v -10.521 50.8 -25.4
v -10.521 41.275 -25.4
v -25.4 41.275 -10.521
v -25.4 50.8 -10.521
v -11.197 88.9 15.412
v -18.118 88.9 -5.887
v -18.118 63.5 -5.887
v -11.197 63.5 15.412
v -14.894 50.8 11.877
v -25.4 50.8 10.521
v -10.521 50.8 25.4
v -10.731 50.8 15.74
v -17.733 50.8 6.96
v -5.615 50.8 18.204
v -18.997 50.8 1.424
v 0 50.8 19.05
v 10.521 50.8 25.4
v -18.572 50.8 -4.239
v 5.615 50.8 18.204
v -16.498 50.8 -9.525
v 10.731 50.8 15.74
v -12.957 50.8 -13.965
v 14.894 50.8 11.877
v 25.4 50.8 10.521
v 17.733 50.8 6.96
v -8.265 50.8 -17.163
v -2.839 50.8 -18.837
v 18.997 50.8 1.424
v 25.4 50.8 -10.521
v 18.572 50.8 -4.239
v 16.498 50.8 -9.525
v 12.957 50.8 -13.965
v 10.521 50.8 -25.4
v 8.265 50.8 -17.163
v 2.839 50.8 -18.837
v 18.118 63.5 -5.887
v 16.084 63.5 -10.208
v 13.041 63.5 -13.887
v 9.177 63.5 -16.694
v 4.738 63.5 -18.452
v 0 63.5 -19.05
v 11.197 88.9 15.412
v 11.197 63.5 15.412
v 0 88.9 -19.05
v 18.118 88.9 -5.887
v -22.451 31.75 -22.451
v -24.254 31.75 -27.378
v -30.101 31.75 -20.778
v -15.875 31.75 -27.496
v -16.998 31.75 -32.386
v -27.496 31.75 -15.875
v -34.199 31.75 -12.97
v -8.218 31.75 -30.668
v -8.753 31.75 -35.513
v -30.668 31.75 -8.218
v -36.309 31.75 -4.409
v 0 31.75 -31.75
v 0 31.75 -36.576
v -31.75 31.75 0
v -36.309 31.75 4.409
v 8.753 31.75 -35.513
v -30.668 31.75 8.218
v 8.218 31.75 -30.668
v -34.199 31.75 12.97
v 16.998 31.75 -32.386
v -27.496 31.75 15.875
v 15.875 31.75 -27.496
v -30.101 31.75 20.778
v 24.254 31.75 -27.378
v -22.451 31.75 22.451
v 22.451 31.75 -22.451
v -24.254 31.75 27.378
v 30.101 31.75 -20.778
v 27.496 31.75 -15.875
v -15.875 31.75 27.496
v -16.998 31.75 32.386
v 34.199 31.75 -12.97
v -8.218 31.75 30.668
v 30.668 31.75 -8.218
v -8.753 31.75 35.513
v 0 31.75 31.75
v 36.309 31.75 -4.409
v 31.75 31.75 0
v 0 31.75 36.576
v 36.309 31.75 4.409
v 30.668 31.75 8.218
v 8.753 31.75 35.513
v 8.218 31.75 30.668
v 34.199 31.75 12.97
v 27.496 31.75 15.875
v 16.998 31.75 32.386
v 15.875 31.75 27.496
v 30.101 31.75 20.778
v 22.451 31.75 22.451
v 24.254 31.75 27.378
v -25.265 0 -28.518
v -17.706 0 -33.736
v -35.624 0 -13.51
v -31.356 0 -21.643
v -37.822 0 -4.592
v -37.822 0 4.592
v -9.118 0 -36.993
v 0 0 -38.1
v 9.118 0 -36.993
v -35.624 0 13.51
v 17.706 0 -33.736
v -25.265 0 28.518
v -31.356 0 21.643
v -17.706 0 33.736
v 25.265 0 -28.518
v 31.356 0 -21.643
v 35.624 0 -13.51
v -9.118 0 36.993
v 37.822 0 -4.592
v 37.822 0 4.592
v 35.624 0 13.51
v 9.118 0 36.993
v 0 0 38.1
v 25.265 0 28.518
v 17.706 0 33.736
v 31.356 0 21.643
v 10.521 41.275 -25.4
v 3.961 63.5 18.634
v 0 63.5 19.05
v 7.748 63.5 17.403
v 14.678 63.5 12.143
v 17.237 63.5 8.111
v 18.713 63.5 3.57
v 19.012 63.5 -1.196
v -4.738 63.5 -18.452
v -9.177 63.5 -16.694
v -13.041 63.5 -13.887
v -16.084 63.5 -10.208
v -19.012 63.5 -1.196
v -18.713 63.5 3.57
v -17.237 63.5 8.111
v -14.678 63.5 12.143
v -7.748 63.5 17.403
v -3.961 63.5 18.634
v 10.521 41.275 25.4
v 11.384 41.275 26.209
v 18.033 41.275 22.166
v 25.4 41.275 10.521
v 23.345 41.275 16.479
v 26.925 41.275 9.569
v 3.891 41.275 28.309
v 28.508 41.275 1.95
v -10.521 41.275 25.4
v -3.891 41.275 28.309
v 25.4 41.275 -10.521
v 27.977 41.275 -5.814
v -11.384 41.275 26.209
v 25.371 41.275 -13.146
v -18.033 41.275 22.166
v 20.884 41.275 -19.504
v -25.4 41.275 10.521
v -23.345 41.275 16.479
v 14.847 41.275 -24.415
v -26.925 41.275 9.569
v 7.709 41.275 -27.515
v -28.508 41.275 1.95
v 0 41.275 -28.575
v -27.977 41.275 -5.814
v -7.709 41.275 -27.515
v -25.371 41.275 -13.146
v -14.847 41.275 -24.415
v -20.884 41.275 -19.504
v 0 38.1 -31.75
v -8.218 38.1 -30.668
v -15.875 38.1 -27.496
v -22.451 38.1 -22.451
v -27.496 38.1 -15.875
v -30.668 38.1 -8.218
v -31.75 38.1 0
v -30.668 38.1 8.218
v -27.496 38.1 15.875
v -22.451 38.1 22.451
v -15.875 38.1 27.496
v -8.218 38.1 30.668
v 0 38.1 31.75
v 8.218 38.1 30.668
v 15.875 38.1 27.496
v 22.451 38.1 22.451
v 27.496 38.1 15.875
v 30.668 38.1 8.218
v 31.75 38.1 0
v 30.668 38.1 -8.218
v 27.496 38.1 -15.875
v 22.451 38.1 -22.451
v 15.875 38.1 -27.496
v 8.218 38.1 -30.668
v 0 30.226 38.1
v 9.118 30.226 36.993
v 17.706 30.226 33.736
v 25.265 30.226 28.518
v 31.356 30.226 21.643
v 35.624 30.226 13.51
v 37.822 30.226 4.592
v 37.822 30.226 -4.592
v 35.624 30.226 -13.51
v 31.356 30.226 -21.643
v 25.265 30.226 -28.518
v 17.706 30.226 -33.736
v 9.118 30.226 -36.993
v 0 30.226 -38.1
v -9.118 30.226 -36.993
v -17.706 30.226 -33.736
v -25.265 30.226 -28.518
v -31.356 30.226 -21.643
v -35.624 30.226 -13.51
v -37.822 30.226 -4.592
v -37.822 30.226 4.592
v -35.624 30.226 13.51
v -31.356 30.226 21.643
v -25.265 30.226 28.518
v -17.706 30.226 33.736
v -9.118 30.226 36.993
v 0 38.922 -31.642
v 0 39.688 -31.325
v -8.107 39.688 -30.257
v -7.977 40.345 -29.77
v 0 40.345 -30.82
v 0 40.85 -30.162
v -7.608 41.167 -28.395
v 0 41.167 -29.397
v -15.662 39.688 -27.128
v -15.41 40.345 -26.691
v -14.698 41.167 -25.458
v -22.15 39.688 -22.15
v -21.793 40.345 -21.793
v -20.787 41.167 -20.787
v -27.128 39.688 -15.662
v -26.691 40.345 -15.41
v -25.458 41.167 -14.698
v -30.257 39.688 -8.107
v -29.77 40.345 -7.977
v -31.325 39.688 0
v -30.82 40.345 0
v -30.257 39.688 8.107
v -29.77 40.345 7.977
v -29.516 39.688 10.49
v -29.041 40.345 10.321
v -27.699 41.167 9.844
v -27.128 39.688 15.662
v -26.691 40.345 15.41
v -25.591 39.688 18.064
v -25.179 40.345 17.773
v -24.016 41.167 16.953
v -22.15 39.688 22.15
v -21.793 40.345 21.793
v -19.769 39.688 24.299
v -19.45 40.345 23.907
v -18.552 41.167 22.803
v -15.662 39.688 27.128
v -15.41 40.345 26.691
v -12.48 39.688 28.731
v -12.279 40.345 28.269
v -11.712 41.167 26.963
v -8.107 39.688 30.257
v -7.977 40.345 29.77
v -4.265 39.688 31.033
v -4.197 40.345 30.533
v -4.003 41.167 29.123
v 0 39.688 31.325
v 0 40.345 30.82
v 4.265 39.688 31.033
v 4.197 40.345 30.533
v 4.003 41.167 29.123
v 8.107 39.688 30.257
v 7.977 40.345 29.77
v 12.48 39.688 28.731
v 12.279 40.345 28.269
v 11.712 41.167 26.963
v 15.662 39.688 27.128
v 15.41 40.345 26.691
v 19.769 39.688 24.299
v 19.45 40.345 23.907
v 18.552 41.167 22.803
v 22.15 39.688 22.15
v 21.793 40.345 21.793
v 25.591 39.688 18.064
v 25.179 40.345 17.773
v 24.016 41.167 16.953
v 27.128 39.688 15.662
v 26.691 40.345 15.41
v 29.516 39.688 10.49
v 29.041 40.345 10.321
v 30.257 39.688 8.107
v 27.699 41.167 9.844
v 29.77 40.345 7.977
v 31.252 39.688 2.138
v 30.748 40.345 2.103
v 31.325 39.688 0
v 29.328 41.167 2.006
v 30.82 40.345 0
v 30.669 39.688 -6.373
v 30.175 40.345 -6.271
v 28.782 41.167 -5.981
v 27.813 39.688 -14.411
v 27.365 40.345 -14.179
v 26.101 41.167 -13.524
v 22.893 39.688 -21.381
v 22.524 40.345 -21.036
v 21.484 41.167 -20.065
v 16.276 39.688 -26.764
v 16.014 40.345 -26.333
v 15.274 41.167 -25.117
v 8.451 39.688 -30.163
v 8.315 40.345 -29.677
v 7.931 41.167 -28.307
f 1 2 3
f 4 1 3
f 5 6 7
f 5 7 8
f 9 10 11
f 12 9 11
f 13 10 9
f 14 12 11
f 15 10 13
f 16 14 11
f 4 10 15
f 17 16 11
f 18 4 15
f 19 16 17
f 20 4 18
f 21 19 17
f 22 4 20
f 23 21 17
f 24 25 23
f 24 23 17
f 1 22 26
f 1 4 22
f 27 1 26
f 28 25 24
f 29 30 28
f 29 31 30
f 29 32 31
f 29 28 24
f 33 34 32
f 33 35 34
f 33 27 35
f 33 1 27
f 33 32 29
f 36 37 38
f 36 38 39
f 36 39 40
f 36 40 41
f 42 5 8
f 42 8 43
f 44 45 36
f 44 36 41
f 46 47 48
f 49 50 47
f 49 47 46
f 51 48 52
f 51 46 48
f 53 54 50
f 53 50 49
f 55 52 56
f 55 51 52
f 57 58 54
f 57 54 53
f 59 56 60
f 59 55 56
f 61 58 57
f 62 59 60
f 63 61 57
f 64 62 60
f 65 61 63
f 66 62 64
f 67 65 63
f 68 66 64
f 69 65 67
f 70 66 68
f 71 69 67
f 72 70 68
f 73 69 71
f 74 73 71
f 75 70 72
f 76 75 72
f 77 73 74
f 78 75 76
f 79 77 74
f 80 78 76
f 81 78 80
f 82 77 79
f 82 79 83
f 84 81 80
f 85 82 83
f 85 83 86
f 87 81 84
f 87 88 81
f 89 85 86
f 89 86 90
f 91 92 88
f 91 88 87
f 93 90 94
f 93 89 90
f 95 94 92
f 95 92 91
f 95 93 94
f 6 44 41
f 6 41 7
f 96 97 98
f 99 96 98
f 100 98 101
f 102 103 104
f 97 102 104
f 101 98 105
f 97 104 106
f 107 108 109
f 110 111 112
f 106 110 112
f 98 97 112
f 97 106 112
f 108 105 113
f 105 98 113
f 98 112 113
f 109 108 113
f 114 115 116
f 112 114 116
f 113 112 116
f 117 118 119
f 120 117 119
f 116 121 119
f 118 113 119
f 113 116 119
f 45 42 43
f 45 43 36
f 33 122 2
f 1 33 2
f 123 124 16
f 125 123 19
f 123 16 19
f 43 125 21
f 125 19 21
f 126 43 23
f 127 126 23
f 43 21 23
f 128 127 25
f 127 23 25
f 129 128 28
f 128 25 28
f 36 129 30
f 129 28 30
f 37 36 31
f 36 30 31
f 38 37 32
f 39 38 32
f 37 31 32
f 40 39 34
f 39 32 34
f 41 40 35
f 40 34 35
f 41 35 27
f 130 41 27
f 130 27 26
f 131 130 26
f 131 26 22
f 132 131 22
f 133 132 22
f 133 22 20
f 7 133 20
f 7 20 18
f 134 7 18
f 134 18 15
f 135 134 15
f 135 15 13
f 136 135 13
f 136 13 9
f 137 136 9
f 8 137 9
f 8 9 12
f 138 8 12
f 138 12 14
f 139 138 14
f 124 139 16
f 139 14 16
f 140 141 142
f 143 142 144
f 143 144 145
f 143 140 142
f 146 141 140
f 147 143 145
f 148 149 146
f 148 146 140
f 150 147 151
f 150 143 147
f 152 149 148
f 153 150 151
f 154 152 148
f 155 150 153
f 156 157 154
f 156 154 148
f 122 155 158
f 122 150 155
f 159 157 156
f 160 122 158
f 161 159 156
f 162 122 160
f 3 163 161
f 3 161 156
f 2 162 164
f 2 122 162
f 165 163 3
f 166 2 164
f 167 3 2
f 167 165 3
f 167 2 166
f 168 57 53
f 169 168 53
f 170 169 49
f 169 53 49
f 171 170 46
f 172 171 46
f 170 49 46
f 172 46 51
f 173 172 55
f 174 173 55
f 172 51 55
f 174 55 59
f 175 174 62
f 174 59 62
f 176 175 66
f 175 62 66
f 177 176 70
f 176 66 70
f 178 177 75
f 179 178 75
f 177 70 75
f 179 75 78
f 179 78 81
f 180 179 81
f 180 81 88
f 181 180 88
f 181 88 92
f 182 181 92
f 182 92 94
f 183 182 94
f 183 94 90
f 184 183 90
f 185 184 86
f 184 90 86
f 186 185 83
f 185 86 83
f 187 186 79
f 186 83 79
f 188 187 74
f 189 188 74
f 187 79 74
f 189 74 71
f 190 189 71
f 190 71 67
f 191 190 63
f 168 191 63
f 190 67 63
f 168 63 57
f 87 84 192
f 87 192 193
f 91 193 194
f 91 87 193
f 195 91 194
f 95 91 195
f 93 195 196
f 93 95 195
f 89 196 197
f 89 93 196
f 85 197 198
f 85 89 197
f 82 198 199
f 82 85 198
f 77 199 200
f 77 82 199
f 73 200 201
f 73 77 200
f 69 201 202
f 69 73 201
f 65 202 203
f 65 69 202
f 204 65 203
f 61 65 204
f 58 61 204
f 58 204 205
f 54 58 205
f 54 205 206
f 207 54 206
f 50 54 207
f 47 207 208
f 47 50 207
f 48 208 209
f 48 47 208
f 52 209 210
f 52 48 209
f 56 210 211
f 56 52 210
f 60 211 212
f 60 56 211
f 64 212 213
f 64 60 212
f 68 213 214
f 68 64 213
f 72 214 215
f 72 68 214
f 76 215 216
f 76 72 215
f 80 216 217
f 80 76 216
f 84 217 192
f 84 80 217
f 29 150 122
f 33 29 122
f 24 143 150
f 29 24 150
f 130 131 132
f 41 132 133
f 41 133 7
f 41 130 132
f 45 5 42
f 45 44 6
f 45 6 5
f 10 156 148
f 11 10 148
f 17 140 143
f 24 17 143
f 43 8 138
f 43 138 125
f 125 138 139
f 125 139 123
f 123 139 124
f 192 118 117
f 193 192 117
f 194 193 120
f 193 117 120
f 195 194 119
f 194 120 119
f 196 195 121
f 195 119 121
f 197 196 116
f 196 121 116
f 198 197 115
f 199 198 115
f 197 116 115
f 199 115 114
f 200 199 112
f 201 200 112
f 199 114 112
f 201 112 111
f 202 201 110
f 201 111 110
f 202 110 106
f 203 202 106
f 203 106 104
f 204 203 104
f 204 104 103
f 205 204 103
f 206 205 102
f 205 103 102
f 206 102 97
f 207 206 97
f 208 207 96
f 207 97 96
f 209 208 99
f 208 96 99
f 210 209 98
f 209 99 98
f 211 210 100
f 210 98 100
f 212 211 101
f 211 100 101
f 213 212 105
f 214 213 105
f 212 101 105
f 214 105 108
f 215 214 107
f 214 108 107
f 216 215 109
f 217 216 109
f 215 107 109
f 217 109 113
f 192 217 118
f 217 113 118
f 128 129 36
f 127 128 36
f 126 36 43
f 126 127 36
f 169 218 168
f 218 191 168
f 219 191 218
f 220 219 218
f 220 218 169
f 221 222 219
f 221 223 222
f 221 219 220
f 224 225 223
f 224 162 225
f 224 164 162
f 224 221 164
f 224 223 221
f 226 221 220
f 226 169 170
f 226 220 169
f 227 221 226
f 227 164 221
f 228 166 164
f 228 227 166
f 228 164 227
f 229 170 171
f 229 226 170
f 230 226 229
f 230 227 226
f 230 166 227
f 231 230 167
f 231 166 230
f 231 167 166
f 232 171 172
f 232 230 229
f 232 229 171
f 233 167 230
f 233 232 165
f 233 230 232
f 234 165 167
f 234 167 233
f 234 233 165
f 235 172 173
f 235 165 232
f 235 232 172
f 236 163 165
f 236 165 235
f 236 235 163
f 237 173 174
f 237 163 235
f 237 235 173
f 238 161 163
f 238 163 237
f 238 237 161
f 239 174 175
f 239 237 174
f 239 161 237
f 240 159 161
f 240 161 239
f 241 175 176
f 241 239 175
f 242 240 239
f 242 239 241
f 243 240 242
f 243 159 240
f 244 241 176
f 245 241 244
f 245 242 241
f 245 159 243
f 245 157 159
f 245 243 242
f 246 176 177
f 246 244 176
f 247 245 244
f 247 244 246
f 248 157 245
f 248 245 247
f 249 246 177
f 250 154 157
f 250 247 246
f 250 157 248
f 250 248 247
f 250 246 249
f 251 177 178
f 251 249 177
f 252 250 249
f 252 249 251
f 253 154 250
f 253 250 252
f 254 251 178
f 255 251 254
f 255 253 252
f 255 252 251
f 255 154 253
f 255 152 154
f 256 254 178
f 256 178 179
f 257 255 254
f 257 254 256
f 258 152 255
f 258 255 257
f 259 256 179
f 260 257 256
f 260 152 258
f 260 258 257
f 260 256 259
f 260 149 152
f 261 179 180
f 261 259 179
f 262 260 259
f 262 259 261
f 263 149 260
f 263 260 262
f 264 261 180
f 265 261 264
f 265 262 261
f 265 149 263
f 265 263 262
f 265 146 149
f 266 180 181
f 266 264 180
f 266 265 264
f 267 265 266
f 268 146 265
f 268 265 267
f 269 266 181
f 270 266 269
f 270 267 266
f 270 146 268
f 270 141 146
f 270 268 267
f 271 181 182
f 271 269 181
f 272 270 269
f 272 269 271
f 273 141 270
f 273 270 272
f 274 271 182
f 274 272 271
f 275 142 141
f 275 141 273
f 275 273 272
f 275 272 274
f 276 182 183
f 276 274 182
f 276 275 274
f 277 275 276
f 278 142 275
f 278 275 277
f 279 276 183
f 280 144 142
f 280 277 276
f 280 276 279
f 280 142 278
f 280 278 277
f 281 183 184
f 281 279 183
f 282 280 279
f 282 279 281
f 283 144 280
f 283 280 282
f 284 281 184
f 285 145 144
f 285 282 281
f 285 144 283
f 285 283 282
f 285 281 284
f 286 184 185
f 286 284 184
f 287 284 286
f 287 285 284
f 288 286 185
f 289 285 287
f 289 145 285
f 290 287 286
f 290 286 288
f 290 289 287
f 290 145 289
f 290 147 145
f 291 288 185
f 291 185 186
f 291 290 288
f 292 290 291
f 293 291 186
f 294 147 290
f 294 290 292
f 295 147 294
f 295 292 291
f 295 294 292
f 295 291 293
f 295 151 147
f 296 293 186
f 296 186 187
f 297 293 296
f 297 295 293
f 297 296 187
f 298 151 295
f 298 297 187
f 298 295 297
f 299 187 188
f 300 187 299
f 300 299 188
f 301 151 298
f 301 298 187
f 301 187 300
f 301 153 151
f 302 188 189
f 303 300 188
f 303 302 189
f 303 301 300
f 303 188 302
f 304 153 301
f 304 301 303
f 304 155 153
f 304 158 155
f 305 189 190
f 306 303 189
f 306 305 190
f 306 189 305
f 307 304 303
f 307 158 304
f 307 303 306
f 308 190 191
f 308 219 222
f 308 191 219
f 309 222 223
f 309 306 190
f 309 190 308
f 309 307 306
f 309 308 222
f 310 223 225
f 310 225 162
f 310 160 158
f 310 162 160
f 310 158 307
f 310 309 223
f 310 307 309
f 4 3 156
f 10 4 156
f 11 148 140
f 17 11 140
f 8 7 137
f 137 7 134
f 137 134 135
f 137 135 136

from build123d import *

# Parameters (mm, degrees)
SKETCH2_R           = 38.1
BOSS_EXTRUDE1_DEPTH = 31.75
CHAMFER1_SIZE       = 1.524
SKETCH3_R           = 31.75
BOSS_EXTRUDE3_DEPTH = 9.525
FILLET1_R           = 3.175
BOSS_EXTRUDE4_DEPTH = 9.525
SKETCH5_R           = 19.05
BOSS_EXTRUDE5_DEPTH = 12.7
BOSS_EXTRUDE6_DEPTH = 25.4


with BuildPart() as part:
    # Sketch2 → Boss-Extrude1 (new body)
    with BuildSketch(Plane(origin=(0, 0, 0), x_dir=(1, 0, 0), z_dir=(0, 1, 0))):
        with Locations(Location((0, 0, 0), (0, 0, 270))):
            Circle(SKETCH2_R)
    extrude(amount=BOSS_EXTRUDE1_DEPTH)

    # Chamfer1
    chamfer1_edges = [part.edges().sort_by_distance(p)[0] for p in [
        (0, 31.75, -38.1),
    ]]
    chamfer(chamfer1_edges, length=CHAMFER1_SIZE)

    # Sketch3 → Boss-Extrude3 (add)
    with BuildSketch(Plane(origin=(0, 31.75, 0), x_dir=(1, 0, 0), z_dir=(0, 1, 0))):
        with Locations(Location((0, 0, 0), (0, 0, 90))):
            Circle(SKETCH3_R)
    extrude(amount=BOSS_EXTRUDE3_DEPTH)

    # Fillet1
    fillet1_edges = [part.edges().sort_by_distance(p)[0] for p in [
        (0, 41.275, 31.75),
    ]]
    fillet(fillet1_edges, radius=FILLET1_R)

    # Sketch4 → Boss-Extrude4 (add)
    with BuildSketch(Plane(origin=(0, 41.275, 0), x_dir=(1, 0, 0), z_dir=(0, 1, 0))):
        Polygon((25.4, 10.521024484), (10.521024484, 25.4), (-10.521024484, 25.4), (-25.4, 10.521024484), (-25.4, -10.521024484), (-10.521024484, -25.4), (10.521024484, -25.4), (25.4, -10.521024484), align=None)
    extrude(amount=BOSS_EXTRUDE4_DEPTH)

    # Sketch5 → Boss-Extrude5 (add)
    with BuildSketch(Plane(origin=(0, 50.8, 0), x_dir=(1, 0, 0), z_dir=(0, 1, 0))):
        with Locations(Location((0, 0, 0), (0, 0, 270))):
            Circle(SKETCH5_R)
    extrude(amount=BOSS_EXTRUDE5_DEPTH)

    # Sketch6 → Boss-Extrude6 (add)
    with BuildSketch(Plane(origin=(0, 63.5, 0), x_dir=(1, 0, 0), z_dir=(0, 1, 0))):
        Polygon((-11.197309056, -15.411773743), (11.197309056, -15.411773743), (18.117626635, 5.886773743), (0, 19.05), (-18.117626635, 5.886773743), align=None)
    extrude(amount=BOSS_EXTRUDE6_DEPTH)


solid = part.part
